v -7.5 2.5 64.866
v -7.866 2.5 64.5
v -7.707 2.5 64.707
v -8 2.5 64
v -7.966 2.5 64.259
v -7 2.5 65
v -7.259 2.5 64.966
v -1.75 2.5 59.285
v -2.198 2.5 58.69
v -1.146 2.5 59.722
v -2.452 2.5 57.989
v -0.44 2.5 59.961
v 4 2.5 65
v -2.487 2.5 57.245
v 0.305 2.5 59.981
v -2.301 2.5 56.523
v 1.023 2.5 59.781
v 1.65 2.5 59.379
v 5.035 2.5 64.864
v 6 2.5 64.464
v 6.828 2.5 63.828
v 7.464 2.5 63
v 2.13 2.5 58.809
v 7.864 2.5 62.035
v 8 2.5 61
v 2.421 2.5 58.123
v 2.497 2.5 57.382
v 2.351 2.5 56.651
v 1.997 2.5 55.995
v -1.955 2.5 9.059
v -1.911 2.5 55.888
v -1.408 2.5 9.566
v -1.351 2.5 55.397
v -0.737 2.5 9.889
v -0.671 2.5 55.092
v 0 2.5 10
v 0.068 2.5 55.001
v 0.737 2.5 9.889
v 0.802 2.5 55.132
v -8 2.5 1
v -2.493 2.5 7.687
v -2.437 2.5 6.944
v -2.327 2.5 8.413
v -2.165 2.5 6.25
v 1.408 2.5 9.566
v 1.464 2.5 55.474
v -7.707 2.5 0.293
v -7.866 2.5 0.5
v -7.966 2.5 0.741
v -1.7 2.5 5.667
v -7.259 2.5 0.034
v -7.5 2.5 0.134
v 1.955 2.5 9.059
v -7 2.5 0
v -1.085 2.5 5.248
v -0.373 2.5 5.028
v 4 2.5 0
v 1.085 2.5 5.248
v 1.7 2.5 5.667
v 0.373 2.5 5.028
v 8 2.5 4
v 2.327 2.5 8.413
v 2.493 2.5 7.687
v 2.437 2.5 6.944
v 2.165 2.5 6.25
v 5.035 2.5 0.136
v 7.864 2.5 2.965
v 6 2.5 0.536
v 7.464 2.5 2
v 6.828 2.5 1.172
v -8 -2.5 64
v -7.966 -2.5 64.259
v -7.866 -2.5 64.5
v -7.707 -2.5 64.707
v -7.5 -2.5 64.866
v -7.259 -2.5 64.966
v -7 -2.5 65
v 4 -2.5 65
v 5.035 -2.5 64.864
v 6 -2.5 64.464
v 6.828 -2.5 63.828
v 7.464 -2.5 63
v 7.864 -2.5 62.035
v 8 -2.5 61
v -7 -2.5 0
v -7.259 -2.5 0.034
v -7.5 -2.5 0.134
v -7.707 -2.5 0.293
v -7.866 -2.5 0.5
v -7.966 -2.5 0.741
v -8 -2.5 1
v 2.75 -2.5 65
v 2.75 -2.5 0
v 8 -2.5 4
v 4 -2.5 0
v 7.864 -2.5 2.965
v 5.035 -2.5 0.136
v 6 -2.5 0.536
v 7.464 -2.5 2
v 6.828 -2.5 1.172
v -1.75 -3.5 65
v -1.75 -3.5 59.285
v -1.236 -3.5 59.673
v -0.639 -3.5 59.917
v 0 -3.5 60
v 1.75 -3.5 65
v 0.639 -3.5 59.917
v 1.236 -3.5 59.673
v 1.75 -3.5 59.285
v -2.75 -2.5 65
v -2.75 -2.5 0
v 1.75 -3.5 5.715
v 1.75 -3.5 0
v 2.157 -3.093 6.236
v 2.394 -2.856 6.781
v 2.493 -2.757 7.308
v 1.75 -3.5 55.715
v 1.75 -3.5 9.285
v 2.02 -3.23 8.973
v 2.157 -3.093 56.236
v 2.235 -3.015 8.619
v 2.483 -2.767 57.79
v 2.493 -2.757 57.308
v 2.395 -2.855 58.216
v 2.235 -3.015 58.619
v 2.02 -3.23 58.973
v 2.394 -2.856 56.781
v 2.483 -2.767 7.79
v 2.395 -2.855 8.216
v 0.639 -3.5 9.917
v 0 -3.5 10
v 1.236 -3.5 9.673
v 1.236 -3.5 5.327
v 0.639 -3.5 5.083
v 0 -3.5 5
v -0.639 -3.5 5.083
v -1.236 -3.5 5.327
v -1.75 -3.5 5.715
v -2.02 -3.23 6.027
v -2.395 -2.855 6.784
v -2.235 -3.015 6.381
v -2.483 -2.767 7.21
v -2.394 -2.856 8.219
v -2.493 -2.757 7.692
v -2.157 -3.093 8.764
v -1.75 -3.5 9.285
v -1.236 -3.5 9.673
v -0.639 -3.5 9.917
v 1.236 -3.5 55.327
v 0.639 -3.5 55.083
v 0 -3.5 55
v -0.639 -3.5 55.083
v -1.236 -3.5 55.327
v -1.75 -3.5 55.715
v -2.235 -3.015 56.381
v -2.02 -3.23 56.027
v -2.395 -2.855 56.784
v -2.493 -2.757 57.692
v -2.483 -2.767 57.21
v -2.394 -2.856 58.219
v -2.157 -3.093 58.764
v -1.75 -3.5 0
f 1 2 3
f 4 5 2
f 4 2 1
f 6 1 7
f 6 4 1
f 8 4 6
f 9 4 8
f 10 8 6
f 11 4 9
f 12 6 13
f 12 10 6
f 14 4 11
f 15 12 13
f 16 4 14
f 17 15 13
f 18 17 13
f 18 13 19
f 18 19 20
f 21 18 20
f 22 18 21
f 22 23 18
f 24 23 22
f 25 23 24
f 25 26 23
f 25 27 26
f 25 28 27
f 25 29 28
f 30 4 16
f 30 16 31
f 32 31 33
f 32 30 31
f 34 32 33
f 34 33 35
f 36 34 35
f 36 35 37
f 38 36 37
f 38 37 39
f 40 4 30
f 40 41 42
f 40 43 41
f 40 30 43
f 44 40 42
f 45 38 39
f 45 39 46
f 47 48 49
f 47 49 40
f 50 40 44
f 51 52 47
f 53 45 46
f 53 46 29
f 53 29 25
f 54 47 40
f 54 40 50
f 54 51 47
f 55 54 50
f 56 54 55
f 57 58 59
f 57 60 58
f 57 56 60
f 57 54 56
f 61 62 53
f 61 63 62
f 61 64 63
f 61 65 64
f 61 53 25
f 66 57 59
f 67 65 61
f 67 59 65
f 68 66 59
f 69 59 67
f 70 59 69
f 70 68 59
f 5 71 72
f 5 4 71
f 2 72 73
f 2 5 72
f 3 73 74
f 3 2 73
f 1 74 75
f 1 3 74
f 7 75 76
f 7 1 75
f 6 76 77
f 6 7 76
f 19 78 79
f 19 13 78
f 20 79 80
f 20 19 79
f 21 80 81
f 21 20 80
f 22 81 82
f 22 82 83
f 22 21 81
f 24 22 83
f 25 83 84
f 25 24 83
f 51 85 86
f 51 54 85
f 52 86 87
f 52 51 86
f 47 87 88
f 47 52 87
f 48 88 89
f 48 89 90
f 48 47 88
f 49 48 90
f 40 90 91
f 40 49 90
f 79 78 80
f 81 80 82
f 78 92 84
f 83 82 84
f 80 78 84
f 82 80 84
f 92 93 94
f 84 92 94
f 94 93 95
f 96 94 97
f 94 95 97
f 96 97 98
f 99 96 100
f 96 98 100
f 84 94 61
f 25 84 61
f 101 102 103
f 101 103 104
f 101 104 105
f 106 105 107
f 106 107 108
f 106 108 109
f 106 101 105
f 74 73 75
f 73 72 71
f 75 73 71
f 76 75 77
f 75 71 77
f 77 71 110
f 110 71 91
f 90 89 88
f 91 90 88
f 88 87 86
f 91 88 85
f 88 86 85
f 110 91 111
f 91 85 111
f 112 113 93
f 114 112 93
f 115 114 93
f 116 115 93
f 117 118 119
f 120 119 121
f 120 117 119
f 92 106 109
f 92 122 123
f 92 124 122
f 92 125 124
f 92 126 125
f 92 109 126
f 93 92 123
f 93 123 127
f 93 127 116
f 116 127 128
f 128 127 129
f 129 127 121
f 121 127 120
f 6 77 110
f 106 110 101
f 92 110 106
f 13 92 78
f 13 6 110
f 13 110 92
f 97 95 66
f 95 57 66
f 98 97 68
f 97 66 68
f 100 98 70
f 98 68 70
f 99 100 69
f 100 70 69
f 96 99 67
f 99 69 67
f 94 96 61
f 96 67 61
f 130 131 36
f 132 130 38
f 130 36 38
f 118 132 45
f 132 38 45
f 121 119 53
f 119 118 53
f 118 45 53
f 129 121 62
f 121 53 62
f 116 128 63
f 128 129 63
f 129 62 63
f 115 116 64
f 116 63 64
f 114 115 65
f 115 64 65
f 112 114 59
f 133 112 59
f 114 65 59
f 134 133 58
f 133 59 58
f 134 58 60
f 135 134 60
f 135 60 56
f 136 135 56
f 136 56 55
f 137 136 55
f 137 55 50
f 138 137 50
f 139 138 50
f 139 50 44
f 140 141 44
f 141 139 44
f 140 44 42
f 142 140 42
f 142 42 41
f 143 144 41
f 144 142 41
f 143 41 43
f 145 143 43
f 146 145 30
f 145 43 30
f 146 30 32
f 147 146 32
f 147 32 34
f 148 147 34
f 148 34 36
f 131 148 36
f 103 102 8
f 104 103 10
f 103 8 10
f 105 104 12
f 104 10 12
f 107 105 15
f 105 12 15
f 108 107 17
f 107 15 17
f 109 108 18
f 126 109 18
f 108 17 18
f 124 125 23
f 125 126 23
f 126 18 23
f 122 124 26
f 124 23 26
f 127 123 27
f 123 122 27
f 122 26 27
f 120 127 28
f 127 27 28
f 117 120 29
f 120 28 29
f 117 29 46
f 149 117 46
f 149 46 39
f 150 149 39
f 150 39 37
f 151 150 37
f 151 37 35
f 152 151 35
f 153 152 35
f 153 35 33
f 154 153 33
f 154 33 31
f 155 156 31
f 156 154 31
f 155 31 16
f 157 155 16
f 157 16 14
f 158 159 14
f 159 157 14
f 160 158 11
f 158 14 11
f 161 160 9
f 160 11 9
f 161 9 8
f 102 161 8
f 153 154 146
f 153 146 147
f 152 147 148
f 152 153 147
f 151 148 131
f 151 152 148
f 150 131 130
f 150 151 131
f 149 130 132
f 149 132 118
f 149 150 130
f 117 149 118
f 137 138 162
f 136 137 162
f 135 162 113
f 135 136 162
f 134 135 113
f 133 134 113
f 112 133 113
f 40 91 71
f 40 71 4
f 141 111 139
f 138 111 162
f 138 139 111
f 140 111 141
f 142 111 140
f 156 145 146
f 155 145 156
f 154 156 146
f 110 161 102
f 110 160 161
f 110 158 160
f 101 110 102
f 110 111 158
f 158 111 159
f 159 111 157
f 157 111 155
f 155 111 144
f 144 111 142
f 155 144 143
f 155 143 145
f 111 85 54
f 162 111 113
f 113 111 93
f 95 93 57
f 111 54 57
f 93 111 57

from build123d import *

# Parameters (mm, degrees)
ESQUISSE1_W             = 16
ESQUISSE1_H             = 5
BOSS_EXTRU_1_DEPTH      = 65
BOSS_EXTRU_3_DEPTH      = 65
ESQUISSE2_R             = 2.5
ENL_V_MAT_EXTRU_1_DEPTH = 66.76473219
CONG_1_R                = 4
CONG_2_R                = 1


with BuildPart() as part:
    # Esquisse1 → Boss.-Extru.1 (new body)
    with BuildSketch(Plane.XY):
        Rectangle(ESQUISSE1_W, ESQUISSE1_H)
    extrude(amount=BOSS_EXTRU_1_DEPTH)

    # Esquisse4 → Boss.-Extru.3 (add)
    with BuildSketch(Plane.XY.offset(65)):
        Polygon((-1.75, -3.5), (1.75, -3.5), (2.75, -2.5), (-2.75, -2.5), align=None)
    extrude(amount=-BOSS_EXTRU_3_DEPTH)

    # Esquisse2 → Enlèv. mat.-Extru.1 (cut, through all)
    with BuildSketch(Plane(origin=(0, 2.5, 0), x_dir=(1, 0, 0), z_dir=(0, 1, 0))):
        with Locations(Location((0, -7.5, 0), (0, 0, 270))):
            Circle(ESQUISSE2_R)
        with Locations(Location((0, -57.5, 0), (0, 0, 225.572995999))):
            Circle(ESQUISSE2_R)
    extrude(amount=-ENL_V_MAT_EXTRU_1_DEPTH, mode=Mode.SUBTRACT)

    # Congé1
    cong_1_edges = [part.edges().sort_by_distance(p)[0] for p in [
        (8, 0, 65),
        (8, 0, 0),
    ]]
    fillet(cong_1_edges, radius=CONG_1_R)

    # Congé2
    cong_2_edges = [part.edges().sort_by_distance(p)[0] for p in [
        (-8, 0, 65),
        (-8, 0, 0),
    ]]
    fillet(cong_2_edges, radius=CONG_2_R)


solid = part.part
